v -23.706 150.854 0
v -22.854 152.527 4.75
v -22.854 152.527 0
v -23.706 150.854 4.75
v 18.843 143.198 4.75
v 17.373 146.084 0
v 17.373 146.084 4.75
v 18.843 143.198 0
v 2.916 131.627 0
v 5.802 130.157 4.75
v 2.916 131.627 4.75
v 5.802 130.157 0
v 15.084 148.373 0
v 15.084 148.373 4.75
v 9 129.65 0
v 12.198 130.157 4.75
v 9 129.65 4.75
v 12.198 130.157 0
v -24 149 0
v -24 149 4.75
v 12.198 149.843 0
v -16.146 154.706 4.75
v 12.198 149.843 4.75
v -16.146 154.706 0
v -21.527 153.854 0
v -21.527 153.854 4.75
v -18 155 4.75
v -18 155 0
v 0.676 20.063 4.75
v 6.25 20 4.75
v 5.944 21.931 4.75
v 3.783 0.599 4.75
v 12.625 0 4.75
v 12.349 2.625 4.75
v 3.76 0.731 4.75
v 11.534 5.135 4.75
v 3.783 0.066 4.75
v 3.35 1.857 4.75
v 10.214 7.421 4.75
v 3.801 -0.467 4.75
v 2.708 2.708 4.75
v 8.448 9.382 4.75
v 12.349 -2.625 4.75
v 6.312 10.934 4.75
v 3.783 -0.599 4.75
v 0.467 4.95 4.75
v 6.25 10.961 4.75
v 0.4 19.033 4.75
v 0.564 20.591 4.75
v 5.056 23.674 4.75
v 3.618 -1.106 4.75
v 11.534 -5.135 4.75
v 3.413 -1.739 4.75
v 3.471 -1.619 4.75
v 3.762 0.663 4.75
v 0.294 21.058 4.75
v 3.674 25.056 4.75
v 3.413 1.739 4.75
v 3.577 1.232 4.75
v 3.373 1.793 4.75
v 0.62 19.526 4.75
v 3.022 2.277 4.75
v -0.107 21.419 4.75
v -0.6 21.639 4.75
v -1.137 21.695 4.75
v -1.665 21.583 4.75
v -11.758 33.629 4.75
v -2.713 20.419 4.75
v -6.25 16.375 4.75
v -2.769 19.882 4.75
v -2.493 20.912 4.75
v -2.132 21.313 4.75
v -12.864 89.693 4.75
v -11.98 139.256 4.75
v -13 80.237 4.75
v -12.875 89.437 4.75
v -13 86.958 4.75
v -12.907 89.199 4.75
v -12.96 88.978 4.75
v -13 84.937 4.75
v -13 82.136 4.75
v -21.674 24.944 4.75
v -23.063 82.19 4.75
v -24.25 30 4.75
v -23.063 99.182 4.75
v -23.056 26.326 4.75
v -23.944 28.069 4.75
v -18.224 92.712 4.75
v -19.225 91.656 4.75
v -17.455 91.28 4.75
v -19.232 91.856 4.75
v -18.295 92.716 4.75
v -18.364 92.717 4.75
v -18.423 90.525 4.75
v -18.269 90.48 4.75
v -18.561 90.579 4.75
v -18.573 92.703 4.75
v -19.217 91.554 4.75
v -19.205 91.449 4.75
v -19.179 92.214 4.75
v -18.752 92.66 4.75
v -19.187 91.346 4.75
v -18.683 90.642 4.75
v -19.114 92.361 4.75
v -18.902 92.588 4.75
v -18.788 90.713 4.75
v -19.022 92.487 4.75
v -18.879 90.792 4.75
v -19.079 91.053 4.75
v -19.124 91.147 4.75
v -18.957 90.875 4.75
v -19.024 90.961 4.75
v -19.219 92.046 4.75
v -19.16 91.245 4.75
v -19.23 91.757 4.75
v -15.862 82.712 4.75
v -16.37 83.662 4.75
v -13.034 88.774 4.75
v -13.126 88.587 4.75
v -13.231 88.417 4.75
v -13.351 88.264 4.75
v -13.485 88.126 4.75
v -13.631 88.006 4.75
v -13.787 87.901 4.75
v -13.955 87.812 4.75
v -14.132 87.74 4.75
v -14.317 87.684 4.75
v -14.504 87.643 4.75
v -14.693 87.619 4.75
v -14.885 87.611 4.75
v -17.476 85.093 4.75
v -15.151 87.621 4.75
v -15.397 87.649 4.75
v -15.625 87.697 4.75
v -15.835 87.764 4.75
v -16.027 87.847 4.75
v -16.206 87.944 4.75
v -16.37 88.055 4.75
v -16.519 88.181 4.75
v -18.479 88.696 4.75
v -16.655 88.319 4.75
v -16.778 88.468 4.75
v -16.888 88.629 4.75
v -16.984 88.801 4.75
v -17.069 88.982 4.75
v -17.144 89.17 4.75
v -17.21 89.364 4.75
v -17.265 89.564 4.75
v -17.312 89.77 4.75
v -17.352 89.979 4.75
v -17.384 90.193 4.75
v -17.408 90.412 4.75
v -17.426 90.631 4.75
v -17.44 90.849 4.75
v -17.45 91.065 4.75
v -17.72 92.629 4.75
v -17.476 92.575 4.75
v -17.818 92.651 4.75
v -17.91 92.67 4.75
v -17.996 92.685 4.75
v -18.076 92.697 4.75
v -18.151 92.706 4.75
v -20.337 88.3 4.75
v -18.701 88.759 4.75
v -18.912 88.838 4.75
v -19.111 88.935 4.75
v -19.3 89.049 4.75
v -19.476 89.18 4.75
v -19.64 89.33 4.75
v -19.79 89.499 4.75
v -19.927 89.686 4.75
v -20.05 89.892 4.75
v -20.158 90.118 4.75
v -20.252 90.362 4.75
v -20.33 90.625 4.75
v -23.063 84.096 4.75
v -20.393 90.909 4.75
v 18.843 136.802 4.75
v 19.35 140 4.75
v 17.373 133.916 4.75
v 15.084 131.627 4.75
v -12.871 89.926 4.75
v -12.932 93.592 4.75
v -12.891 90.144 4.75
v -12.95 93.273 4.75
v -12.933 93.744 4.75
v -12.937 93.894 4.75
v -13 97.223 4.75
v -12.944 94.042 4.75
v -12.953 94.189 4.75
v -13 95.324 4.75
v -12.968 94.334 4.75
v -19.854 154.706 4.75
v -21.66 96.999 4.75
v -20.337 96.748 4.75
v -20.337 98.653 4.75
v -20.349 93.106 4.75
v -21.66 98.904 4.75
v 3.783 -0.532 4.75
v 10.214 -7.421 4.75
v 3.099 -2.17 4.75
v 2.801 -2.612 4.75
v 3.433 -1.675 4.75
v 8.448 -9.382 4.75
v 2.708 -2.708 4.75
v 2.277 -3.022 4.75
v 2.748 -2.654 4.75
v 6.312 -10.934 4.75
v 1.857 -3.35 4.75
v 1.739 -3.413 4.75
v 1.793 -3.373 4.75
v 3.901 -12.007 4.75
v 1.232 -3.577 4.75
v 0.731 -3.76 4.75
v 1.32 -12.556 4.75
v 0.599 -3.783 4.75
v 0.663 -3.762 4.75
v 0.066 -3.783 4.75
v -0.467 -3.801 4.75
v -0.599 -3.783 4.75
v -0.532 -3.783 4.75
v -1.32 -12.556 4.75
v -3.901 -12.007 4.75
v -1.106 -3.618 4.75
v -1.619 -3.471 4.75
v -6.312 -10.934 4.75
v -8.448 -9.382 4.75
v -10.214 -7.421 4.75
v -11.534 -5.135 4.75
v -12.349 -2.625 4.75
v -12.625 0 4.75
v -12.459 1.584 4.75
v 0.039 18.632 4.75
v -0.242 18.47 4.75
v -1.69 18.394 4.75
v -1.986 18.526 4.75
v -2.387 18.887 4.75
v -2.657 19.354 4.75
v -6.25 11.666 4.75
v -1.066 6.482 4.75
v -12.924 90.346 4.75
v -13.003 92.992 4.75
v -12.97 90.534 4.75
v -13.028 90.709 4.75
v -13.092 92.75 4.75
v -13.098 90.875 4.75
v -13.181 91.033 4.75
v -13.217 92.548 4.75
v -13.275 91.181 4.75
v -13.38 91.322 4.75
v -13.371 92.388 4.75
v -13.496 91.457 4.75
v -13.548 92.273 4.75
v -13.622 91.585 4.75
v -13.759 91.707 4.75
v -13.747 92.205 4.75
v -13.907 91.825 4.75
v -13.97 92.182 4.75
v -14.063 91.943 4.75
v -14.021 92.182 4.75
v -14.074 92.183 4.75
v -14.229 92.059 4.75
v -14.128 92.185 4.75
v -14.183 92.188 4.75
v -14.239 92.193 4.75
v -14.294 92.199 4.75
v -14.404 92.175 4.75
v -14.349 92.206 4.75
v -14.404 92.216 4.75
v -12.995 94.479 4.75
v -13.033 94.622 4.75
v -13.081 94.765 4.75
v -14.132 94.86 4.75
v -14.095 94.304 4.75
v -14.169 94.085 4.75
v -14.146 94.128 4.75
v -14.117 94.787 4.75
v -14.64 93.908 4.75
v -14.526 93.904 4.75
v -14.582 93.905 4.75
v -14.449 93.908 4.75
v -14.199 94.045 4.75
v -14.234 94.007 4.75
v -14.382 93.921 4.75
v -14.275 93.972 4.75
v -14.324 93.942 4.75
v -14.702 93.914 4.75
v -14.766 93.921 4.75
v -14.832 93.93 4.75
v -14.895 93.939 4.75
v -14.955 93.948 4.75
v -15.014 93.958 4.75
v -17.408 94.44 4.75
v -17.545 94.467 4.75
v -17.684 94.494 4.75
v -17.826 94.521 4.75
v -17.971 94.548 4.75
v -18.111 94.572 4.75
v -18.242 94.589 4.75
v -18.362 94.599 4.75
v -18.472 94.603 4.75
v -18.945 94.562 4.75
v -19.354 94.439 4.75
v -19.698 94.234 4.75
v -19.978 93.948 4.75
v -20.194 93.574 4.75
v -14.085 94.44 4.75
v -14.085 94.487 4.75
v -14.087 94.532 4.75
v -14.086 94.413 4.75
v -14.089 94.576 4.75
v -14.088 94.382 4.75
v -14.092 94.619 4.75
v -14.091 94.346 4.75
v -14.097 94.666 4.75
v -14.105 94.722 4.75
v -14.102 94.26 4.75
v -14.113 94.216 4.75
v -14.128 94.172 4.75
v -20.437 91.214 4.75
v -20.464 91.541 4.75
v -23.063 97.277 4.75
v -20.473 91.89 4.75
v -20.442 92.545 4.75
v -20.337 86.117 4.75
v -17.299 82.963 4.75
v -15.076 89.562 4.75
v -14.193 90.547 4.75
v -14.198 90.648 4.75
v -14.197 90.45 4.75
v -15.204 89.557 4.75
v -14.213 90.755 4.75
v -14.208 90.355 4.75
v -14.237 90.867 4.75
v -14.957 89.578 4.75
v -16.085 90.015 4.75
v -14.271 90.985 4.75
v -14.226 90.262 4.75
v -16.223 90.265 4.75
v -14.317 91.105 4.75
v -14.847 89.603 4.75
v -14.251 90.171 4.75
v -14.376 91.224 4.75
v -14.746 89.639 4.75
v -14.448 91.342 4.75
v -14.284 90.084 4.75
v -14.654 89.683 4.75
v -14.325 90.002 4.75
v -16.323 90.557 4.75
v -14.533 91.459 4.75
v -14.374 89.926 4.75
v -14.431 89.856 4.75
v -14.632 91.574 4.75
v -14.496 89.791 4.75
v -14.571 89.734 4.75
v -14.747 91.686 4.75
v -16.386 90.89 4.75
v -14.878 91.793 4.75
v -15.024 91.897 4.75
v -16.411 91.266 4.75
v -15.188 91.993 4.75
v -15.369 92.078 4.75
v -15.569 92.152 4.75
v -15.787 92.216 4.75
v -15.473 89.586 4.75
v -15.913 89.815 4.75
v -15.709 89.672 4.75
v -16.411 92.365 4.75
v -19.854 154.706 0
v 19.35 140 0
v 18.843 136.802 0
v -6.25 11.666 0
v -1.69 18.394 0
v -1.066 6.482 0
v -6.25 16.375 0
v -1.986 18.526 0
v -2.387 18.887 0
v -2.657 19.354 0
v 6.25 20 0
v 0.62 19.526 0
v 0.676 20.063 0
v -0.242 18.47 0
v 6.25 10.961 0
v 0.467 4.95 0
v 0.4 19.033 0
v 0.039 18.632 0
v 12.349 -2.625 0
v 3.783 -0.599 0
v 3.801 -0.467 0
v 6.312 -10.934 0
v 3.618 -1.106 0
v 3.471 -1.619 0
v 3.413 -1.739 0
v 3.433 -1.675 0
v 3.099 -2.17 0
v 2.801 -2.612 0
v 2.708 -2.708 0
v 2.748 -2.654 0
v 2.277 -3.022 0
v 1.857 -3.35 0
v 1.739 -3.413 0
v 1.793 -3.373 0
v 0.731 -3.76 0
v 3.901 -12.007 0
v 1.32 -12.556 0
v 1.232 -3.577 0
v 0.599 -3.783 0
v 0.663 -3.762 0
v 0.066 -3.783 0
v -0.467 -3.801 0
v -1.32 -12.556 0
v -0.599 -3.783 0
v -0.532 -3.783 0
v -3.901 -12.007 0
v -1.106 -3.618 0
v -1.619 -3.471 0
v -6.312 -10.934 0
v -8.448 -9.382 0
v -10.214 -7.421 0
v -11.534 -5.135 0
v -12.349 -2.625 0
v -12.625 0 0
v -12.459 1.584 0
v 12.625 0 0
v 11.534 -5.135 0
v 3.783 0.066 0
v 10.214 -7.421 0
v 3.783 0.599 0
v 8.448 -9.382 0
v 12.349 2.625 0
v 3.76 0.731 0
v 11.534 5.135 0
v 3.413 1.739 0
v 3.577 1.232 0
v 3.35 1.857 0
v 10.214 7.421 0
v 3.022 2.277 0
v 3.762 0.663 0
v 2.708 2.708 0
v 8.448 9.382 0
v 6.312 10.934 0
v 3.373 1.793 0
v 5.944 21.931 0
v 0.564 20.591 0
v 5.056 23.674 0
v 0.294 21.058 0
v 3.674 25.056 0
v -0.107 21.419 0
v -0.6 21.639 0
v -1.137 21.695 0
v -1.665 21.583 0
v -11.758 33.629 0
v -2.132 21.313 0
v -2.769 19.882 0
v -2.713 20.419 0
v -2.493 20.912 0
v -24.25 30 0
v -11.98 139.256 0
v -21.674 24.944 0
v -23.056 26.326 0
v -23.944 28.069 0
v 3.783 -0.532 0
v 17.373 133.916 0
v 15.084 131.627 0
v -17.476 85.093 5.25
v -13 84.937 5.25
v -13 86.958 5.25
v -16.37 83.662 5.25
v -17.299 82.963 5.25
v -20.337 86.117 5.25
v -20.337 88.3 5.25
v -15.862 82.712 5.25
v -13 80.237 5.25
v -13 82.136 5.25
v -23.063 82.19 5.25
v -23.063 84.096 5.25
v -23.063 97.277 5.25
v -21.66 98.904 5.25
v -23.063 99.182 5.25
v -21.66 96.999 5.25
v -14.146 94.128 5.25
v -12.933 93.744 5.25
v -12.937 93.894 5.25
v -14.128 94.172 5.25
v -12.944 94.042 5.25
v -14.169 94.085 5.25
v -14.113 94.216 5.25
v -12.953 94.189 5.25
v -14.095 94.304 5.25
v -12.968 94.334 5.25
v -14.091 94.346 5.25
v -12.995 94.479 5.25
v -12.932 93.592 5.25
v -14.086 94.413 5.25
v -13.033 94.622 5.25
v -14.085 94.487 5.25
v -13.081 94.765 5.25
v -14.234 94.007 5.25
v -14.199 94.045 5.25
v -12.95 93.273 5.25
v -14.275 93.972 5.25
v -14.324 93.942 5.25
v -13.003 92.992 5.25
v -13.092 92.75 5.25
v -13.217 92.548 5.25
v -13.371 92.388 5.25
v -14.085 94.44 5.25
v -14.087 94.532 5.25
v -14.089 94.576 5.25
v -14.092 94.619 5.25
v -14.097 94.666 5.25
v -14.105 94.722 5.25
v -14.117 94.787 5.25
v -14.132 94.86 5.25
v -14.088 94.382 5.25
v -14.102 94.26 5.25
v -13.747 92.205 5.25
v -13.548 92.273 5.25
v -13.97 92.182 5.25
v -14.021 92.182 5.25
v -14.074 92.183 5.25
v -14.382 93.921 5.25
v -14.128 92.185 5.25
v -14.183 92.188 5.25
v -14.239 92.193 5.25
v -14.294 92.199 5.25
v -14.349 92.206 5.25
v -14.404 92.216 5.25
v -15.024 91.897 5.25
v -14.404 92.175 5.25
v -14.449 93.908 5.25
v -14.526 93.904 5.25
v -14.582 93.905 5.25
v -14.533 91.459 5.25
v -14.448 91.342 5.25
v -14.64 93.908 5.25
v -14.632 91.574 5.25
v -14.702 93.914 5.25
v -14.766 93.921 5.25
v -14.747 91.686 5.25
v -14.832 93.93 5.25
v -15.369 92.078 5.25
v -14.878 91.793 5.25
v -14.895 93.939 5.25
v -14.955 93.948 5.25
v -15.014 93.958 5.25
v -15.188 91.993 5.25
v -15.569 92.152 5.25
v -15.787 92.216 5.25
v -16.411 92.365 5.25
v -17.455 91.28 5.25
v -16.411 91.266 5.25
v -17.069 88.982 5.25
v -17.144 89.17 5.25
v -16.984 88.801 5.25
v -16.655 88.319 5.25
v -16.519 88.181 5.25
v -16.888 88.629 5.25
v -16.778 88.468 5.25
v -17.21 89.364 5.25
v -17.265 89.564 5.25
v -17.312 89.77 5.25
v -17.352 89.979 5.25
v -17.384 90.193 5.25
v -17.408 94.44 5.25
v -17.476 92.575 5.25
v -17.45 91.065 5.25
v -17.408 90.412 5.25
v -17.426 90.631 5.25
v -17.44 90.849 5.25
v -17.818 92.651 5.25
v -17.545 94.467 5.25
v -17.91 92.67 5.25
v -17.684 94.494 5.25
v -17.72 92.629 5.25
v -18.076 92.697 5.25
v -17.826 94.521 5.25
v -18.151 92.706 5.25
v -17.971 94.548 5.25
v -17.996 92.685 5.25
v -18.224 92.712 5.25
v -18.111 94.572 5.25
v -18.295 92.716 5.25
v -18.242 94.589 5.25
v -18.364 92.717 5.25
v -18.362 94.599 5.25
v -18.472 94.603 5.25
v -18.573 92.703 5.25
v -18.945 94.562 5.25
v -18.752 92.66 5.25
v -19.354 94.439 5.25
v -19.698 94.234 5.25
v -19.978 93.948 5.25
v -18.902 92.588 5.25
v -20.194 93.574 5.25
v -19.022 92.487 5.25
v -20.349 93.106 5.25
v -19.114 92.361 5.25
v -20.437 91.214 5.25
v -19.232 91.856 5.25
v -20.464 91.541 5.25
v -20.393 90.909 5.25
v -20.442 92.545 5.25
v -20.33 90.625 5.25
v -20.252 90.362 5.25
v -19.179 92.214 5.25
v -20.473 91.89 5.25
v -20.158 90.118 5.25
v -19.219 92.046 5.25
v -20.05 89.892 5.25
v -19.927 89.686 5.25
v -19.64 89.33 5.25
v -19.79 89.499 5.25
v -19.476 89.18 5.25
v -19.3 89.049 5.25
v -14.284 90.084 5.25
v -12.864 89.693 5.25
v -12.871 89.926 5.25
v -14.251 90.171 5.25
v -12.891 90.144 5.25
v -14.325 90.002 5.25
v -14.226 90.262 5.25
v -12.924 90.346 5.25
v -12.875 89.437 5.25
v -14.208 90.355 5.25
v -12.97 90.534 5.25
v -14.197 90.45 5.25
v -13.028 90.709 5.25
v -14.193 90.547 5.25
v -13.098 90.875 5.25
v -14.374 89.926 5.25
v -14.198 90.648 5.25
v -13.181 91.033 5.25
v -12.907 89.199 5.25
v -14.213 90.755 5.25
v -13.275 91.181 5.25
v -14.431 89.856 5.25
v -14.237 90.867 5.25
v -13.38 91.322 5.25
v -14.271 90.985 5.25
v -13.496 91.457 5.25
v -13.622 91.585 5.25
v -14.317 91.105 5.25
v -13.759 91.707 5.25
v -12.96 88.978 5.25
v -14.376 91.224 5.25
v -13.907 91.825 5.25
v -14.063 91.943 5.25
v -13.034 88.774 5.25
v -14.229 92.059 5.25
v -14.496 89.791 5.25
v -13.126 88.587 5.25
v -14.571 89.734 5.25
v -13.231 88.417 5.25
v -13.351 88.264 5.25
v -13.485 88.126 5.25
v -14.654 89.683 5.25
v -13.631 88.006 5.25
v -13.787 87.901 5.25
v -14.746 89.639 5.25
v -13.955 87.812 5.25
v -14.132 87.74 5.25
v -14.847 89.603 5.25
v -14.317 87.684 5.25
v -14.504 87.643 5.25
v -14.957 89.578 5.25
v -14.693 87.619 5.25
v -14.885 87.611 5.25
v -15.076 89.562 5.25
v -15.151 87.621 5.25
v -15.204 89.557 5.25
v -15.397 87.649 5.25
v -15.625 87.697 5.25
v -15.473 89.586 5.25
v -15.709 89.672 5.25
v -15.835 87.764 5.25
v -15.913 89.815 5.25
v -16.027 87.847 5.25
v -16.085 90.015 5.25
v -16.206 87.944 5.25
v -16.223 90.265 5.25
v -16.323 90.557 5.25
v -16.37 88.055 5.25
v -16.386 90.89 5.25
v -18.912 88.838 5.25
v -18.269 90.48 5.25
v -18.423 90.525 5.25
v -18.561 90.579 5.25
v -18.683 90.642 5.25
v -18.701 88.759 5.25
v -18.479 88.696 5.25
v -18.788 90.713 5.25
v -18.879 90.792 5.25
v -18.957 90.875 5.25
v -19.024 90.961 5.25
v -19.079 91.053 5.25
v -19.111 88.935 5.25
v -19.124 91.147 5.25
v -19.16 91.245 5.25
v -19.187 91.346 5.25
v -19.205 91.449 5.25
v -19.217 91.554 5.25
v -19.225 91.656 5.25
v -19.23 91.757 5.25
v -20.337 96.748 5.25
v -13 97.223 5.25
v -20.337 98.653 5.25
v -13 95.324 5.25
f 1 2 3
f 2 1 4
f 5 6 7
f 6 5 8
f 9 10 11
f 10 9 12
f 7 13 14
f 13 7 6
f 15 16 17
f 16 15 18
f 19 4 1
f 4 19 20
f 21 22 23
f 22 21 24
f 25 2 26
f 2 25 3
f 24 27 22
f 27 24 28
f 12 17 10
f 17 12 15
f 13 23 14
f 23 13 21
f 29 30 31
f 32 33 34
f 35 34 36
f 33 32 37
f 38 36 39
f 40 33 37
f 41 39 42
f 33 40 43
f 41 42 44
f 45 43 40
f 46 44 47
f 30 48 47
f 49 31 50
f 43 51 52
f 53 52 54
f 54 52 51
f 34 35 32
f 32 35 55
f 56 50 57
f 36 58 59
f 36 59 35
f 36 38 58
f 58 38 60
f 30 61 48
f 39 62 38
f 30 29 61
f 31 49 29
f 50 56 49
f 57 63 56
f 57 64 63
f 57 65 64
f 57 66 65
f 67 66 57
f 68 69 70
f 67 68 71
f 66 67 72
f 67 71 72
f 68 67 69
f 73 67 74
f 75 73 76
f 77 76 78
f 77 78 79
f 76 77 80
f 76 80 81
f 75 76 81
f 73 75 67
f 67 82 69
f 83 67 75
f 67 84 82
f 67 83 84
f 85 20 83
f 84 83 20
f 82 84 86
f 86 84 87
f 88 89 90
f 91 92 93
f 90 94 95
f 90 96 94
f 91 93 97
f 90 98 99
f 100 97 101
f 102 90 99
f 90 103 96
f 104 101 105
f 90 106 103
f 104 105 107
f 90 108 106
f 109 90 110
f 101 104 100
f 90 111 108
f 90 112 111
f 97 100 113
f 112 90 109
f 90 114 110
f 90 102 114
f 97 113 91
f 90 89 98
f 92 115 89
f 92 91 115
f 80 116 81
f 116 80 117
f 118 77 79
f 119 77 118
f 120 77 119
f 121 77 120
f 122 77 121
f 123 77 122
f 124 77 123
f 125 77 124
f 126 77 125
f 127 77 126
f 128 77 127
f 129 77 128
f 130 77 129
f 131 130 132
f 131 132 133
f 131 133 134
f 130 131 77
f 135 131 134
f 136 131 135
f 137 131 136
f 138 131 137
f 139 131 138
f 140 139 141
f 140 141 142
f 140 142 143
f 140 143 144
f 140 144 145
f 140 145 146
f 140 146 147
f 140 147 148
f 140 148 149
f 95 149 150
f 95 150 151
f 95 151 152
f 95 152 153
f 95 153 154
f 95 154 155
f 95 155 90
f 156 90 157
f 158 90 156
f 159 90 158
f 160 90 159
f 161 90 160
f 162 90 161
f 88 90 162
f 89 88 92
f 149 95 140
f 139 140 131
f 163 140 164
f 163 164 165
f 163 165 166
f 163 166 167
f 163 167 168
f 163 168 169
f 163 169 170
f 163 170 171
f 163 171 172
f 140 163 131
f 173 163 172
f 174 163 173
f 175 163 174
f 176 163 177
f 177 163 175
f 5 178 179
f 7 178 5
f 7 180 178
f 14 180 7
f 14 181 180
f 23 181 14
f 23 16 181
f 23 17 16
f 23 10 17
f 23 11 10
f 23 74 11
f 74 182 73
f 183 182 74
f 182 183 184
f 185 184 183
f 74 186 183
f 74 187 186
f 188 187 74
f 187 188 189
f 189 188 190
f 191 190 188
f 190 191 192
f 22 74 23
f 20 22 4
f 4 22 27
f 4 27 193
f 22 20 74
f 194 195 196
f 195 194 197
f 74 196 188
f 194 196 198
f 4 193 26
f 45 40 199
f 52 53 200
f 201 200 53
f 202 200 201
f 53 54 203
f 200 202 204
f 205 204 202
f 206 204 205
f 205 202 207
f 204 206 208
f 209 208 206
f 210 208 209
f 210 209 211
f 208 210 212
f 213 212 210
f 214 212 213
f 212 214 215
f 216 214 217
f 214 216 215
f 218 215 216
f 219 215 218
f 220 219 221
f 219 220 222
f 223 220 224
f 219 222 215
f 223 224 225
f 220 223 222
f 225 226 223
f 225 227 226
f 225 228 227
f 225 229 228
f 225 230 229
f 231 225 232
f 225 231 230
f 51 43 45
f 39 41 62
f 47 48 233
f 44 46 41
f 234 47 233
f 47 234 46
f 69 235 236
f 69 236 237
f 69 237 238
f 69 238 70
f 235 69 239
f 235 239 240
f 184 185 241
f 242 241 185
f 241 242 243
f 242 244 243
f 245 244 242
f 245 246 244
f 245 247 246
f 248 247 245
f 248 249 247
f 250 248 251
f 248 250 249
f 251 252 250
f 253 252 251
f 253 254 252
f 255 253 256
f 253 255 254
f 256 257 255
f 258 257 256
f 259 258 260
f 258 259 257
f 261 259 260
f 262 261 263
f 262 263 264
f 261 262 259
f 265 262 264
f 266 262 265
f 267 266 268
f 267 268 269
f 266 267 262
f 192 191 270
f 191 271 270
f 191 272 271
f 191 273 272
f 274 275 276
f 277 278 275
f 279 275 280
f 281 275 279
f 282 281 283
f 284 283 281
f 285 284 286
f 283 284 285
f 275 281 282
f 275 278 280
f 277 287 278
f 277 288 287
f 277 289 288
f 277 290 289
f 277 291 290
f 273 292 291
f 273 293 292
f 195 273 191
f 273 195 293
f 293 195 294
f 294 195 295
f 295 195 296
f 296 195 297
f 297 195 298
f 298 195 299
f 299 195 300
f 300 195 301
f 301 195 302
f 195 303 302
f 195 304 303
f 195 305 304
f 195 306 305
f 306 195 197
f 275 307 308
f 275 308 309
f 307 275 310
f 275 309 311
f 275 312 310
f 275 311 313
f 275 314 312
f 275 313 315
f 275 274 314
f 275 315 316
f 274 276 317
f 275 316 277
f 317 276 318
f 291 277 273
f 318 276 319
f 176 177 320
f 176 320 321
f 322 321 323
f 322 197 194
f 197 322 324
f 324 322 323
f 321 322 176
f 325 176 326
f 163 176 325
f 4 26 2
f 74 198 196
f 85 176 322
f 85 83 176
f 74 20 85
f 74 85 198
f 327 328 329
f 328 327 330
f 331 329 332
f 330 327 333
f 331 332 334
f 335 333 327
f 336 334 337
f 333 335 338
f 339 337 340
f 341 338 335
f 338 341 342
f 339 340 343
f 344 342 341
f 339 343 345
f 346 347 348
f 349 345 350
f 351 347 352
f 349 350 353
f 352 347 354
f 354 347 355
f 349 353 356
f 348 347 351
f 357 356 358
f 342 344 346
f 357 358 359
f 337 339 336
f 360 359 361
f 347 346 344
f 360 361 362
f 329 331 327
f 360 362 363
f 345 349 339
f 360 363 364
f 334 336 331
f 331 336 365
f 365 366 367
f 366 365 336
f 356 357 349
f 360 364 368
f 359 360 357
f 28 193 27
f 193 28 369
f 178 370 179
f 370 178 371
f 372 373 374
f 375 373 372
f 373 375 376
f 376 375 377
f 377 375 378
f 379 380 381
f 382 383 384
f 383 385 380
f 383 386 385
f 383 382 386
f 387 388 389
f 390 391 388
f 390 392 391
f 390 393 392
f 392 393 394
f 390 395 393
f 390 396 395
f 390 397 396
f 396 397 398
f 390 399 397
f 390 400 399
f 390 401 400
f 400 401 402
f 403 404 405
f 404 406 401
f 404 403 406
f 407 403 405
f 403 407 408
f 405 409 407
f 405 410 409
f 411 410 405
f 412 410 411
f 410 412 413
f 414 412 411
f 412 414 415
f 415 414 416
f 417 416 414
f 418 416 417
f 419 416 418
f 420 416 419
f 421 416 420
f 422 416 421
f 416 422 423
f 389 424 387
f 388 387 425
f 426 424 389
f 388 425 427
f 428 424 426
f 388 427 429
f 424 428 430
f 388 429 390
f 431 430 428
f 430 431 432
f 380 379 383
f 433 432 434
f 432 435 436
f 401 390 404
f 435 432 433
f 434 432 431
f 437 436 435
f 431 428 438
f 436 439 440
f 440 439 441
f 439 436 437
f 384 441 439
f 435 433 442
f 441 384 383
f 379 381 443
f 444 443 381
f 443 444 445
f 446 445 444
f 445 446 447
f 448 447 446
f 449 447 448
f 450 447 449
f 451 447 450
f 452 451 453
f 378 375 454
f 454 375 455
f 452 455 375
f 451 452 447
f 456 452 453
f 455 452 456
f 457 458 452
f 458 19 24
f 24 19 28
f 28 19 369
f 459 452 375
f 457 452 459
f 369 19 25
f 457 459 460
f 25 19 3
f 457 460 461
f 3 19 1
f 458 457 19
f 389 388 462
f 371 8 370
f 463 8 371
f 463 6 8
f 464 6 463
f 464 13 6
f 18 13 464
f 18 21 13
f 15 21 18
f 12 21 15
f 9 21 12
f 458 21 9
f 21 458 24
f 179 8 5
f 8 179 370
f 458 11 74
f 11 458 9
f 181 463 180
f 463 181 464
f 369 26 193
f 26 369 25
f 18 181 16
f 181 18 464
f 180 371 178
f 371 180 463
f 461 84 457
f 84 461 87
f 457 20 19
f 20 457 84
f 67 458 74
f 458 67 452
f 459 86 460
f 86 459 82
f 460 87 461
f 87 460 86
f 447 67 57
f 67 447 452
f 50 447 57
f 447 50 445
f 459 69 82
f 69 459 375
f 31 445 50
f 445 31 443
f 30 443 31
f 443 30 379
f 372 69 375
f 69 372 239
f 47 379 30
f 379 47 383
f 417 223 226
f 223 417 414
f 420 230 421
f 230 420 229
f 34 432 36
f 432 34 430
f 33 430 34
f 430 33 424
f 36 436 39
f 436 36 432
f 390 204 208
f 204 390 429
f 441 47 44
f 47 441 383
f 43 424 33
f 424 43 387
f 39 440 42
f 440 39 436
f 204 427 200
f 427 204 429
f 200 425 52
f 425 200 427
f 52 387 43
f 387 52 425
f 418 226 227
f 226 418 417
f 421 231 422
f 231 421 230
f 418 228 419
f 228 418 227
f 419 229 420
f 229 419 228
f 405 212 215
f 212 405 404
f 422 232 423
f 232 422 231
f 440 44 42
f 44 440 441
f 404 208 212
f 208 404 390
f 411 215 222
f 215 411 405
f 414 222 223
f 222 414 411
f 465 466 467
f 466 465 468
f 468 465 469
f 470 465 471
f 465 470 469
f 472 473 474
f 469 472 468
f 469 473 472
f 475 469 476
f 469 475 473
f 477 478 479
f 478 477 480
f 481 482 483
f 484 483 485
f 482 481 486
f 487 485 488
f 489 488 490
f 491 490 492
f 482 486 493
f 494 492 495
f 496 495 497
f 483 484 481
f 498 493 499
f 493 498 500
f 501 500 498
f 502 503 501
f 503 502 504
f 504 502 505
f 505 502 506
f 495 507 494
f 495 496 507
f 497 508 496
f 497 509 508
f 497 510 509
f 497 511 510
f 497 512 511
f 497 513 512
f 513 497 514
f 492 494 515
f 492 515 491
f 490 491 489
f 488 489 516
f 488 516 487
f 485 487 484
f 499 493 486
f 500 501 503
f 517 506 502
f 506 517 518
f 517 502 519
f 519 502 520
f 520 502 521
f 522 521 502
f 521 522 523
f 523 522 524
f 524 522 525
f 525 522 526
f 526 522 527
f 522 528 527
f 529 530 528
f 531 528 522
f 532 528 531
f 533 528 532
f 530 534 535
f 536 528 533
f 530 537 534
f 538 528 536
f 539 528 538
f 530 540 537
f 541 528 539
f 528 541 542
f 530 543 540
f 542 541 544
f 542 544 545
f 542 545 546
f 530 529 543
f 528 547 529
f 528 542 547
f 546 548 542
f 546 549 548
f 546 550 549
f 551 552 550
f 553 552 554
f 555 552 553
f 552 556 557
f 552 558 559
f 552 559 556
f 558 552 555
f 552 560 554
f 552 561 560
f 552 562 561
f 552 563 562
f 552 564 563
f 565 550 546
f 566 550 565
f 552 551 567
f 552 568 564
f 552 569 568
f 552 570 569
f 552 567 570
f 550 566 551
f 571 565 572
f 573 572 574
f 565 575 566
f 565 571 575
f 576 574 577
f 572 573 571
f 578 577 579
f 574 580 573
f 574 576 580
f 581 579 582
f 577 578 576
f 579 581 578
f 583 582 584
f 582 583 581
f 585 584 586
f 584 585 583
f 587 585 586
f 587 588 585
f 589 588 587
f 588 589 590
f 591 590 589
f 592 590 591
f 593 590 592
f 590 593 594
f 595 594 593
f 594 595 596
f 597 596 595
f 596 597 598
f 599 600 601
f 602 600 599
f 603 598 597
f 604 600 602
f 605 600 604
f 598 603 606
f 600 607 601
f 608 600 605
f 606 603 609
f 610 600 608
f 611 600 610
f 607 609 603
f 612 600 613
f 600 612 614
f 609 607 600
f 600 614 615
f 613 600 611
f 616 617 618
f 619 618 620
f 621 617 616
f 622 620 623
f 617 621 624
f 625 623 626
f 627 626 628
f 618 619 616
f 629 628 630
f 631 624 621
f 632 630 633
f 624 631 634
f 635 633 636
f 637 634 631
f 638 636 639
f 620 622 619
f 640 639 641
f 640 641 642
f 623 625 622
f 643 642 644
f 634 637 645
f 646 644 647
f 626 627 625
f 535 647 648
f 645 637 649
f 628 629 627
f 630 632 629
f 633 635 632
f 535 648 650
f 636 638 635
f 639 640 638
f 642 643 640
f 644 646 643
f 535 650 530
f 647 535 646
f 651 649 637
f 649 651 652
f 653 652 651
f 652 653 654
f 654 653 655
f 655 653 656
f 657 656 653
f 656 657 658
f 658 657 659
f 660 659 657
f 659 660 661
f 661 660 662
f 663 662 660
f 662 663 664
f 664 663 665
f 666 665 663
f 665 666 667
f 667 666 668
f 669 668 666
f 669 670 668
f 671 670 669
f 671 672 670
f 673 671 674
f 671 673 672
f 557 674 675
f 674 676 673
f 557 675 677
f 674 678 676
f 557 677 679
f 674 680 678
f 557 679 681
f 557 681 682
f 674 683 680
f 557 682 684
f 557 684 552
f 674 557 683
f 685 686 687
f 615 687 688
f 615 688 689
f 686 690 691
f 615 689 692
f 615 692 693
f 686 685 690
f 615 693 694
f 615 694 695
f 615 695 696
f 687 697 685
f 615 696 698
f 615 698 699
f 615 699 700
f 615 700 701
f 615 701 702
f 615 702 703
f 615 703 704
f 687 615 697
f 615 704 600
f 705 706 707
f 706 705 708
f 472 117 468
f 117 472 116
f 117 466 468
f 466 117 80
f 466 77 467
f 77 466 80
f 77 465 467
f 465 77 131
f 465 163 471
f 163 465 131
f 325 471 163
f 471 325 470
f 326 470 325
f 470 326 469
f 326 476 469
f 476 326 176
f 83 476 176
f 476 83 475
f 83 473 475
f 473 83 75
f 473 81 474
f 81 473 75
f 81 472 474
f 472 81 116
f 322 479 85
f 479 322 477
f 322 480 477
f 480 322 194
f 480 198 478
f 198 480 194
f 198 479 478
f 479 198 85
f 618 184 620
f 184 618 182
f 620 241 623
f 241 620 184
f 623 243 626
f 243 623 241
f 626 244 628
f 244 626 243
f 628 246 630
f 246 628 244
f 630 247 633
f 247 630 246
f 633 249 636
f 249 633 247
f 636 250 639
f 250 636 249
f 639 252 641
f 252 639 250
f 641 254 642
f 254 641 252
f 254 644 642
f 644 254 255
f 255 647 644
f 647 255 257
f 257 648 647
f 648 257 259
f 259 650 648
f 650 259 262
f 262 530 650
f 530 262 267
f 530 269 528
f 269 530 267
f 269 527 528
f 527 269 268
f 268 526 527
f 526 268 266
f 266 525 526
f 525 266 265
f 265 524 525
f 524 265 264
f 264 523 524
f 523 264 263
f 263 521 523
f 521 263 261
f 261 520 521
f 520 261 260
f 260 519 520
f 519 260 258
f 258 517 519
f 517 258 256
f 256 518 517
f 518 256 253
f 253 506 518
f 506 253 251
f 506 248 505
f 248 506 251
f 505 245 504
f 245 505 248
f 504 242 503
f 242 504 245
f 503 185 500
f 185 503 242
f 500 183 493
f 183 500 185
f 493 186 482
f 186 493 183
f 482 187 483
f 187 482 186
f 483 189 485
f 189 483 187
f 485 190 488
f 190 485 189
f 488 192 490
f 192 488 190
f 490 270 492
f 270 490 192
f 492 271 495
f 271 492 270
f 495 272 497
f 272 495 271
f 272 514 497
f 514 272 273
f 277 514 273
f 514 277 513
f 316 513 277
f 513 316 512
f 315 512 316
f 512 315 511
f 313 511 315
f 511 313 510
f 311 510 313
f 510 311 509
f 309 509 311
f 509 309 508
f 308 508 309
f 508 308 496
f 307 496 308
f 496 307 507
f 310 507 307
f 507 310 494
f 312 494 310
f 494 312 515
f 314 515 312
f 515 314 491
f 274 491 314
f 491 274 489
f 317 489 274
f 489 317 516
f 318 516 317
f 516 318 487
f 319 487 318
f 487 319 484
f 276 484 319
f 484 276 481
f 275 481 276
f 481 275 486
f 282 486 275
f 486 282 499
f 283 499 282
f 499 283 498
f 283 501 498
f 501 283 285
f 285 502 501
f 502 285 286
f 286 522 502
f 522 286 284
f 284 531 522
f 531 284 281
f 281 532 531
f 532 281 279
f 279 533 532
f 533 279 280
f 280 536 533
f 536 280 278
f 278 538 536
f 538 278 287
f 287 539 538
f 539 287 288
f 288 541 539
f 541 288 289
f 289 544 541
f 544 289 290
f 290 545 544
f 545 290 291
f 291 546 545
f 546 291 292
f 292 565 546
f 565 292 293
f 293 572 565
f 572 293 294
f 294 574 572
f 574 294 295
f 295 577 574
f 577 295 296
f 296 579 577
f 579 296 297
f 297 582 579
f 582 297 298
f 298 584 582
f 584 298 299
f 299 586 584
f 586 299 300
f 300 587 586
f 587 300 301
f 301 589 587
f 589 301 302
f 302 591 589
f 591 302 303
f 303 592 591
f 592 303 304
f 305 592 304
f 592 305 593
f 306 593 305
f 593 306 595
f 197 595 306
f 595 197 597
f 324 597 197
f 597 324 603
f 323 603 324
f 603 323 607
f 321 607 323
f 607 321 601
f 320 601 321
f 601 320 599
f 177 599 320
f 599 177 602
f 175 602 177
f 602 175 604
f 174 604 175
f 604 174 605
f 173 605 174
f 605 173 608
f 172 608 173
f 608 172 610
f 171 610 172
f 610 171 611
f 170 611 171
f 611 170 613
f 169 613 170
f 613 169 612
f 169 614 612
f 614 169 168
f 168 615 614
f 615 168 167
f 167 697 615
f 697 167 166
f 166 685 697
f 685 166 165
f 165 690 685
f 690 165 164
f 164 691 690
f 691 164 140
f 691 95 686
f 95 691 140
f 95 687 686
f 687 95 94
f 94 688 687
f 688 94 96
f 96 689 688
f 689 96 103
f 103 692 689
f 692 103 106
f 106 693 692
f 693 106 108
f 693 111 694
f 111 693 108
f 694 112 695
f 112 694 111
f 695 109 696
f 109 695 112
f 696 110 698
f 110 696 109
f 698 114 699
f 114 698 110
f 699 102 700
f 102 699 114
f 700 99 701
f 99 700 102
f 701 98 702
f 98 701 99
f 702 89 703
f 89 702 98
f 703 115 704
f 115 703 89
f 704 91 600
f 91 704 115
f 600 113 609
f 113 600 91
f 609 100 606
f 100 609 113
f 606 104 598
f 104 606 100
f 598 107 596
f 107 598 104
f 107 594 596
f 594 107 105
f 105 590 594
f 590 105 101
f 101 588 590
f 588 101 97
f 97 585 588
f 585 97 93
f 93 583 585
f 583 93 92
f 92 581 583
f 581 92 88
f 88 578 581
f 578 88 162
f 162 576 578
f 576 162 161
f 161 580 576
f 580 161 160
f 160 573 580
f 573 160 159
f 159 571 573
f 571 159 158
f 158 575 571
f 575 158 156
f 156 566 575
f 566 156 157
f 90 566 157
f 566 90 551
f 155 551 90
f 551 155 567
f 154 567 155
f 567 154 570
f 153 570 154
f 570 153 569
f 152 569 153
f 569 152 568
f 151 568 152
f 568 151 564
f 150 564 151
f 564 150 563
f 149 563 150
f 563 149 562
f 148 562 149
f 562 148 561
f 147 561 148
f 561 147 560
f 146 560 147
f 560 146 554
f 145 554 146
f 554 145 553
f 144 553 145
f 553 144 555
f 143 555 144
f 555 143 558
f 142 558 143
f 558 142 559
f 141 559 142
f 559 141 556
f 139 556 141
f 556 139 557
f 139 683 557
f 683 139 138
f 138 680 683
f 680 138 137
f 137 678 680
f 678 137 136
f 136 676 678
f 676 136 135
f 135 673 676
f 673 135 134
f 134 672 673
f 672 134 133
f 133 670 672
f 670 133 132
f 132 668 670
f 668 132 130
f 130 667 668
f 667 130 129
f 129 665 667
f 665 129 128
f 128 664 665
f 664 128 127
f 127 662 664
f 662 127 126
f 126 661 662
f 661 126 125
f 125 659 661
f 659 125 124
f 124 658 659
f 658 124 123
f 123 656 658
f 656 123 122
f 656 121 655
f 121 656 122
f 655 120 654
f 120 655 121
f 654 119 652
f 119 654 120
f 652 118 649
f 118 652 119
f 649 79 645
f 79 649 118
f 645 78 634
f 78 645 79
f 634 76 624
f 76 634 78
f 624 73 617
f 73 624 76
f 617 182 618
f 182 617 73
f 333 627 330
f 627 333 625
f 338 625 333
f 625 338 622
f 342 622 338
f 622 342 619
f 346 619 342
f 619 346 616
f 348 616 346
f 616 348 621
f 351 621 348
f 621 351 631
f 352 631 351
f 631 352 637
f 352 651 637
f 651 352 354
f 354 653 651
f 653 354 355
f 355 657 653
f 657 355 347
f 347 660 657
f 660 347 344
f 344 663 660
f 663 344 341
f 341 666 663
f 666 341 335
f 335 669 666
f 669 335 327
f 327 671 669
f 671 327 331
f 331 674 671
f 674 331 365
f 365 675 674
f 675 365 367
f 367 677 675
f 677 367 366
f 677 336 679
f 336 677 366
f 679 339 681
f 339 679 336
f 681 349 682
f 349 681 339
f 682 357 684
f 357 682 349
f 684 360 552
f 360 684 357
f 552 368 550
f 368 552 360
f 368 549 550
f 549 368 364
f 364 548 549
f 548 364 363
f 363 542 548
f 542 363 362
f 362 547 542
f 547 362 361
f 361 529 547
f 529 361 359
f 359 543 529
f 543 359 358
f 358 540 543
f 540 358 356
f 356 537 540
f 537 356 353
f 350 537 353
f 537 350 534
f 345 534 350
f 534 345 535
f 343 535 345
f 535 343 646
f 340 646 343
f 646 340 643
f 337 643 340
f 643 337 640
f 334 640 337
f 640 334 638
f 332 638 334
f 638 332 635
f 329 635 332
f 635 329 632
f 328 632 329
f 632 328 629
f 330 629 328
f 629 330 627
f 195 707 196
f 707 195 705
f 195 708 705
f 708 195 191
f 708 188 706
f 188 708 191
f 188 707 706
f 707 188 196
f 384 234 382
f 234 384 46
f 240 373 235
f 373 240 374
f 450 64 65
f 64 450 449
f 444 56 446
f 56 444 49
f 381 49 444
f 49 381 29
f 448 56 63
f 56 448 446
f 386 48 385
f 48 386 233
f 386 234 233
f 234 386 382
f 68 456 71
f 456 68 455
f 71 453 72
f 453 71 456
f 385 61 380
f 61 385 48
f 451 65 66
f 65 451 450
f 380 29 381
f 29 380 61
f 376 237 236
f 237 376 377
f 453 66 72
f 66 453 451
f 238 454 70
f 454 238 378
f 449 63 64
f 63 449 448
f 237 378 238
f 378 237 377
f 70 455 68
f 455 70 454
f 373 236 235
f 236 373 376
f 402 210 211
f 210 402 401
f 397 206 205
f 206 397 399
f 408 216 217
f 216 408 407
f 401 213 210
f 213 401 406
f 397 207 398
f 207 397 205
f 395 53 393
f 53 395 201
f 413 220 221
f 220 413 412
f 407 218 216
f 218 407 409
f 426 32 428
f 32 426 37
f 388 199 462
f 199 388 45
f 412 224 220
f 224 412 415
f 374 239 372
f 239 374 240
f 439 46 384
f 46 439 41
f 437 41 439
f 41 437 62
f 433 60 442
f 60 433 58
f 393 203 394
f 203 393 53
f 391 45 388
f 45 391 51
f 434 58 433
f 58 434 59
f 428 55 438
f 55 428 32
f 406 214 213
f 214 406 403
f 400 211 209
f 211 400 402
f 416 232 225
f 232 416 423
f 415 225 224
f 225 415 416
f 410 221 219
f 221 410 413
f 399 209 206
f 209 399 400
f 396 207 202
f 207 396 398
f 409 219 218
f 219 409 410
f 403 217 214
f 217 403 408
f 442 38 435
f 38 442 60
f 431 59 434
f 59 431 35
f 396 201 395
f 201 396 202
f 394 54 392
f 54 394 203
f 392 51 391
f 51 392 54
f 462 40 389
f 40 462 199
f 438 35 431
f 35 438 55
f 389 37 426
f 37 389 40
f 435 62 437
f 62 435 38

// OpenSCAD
HEIGHT = 4.75;

POST_DIAMETER = 6.85;
POST_HOLE_DIAMETER = 7.66;
ELASTIC_DIAMETER = 1.45;

MOUNT_DIAMETER = 25.25;

EAR_PIECE_DIAMETER = 20.7;
MAIN_POLE_X_OFFSET = -27.0;
MAIN_POLE_WIDTH = 12.5;
EAR_PIECE_HEIGHT = 140.0;
EAR_PIECE_X_OFFSET = 9.0;

module ear_piece() {
    hull() {
        cylinder(h = HEIGHT, r = EAR_PIECE_DIAMETER/2.0, $fn = 20);
        translate([MAIN_POLE_X_OFFSET,9,0]) cylinder(h = HEIGHT, r = 6.0, $fn = 20);
    }
}


module assembly() {
    // Ear piece
    translate([EAR_PIECE_X_OFFSET, EAR_PIECE_HEIGHT, 0]) ear_piece();
    
    // Main arm
    hull () {
        translate([
            MAIN_POLE_X_OFFSET + EAR_PIECE_X_OFFSET,
            EAR_PIECE_HEIGHT + 9,
            0
        ])
            cylinder(h = HEIGHT, r = 6.0, $fn = 20);
        translate([
            MAIN_POLE_X_OFFSET + EAR_PIECE_X_OFFSET,
            30,
            0
        ])
            cylinder(h = HEIGHT, r = MAIN_POLE_WIDTH/2.0, $fn = 20);
    }
    
    hull() {
        translate([
            MAIN_POLE_X_OFFSET + EAR_PIECE_X_OFFSET,
            30,
            0
        ])
            cylinder(h = HEIGHT, r = MAIN_POLE_WIDTH/2.0, $fn = 20);
        translate([0,20,0])
            cylinder(h = HEIGHT, r = MAIN_POLE_WIDTH/2.0, $fn = 20);
    }
    
    hull() {
        cylinder(h = HEIGHT, r = MAIN_POLE_WIDTH/2.0, $fn = 20);
        translate([0,20,0])
            cylinder(h = HEIGHT, r = MAIN_POLE_WIDTH/2.0, $fn = 20);
    }
    
    // Mount to base
    cylinder(h = HEIGHT, r = MOUNT_DIAMETER/2.0, $fn = 30);
    
    // Name
    translate([-13,80,HEIGHT])
        rotate([0,0,90])
            linear_extrude(height = 0.5) {
                text("kai", font = "Liberation Sans:style=Bold Italic");
            }
}

// Cut for mounting
module cut_mount() {
    rotate([0,0,45])
        hull() {
            translate([0,0,-1])
                cylinder(h = HEIGHT + 2, r = POST_HOLE_DIAMETER/2.0, $fn = 20);
            translate([0,20,-1])
                cylinder(h = HEIGHT + 2, r = POST_HOLE_DIAMETER/2.0, $fn = 20);
        }
    rotate([0,0,65])
        hull() {
            translate([0,0,-1])
                cylinder(h = HEIGHT + 2, r = POST_HOLE_DIAMETER/2.0, $fn = 20);
            translate([0,20,-1])
                cylinder(h = HEIGHT + 2, r = POST_HOLE_DIAMETER/2.0, $fn = 20);
        }
    // Elastic hole and slot
    rotate([0,0,3])
        union() {
            hull() {
                translate([0,0,-1])
                    cylinder(h = HEIGHT + 2, r = ELASTIC_DIAMETER/2.0, $fn = 20);
                translate([0,20,-1])
                    cylinder(h = HEIGHT + 2, r = ELASTIC_DIAMETER/2.0, $fn = 20);
            }
            translate([0,20,-1])
                cylinder(h = HEIGHT + 2, r = ELASTIC_DIAMETER/2.0+1, $fn = 20);
        }

}

module assembly_cutout() {
    difference() {
        assembly();
        cut_mount();
    }
}

rotate([0,0,0]) assembly_cutout();
//rotate([0,0,135]) assembly_cutout();

// Design Objectives

module objectives() {
    // The post on which we will install
    #translate([0,0,-1]) cylinder(h = HEIGHT + 2.0, r = POST_DIAMETER/2);
    // Ear placement inner-most
    # translate([9,140,-1]) cylinder(h = HEIGHT + 2.0, r = 3);
    // Ear placement outer-most
    # rotate([0,0,45]) translate([9,140,-1]) cylinder(h = HEIGHT + 2.0, r = 3);
}
//objectives();
